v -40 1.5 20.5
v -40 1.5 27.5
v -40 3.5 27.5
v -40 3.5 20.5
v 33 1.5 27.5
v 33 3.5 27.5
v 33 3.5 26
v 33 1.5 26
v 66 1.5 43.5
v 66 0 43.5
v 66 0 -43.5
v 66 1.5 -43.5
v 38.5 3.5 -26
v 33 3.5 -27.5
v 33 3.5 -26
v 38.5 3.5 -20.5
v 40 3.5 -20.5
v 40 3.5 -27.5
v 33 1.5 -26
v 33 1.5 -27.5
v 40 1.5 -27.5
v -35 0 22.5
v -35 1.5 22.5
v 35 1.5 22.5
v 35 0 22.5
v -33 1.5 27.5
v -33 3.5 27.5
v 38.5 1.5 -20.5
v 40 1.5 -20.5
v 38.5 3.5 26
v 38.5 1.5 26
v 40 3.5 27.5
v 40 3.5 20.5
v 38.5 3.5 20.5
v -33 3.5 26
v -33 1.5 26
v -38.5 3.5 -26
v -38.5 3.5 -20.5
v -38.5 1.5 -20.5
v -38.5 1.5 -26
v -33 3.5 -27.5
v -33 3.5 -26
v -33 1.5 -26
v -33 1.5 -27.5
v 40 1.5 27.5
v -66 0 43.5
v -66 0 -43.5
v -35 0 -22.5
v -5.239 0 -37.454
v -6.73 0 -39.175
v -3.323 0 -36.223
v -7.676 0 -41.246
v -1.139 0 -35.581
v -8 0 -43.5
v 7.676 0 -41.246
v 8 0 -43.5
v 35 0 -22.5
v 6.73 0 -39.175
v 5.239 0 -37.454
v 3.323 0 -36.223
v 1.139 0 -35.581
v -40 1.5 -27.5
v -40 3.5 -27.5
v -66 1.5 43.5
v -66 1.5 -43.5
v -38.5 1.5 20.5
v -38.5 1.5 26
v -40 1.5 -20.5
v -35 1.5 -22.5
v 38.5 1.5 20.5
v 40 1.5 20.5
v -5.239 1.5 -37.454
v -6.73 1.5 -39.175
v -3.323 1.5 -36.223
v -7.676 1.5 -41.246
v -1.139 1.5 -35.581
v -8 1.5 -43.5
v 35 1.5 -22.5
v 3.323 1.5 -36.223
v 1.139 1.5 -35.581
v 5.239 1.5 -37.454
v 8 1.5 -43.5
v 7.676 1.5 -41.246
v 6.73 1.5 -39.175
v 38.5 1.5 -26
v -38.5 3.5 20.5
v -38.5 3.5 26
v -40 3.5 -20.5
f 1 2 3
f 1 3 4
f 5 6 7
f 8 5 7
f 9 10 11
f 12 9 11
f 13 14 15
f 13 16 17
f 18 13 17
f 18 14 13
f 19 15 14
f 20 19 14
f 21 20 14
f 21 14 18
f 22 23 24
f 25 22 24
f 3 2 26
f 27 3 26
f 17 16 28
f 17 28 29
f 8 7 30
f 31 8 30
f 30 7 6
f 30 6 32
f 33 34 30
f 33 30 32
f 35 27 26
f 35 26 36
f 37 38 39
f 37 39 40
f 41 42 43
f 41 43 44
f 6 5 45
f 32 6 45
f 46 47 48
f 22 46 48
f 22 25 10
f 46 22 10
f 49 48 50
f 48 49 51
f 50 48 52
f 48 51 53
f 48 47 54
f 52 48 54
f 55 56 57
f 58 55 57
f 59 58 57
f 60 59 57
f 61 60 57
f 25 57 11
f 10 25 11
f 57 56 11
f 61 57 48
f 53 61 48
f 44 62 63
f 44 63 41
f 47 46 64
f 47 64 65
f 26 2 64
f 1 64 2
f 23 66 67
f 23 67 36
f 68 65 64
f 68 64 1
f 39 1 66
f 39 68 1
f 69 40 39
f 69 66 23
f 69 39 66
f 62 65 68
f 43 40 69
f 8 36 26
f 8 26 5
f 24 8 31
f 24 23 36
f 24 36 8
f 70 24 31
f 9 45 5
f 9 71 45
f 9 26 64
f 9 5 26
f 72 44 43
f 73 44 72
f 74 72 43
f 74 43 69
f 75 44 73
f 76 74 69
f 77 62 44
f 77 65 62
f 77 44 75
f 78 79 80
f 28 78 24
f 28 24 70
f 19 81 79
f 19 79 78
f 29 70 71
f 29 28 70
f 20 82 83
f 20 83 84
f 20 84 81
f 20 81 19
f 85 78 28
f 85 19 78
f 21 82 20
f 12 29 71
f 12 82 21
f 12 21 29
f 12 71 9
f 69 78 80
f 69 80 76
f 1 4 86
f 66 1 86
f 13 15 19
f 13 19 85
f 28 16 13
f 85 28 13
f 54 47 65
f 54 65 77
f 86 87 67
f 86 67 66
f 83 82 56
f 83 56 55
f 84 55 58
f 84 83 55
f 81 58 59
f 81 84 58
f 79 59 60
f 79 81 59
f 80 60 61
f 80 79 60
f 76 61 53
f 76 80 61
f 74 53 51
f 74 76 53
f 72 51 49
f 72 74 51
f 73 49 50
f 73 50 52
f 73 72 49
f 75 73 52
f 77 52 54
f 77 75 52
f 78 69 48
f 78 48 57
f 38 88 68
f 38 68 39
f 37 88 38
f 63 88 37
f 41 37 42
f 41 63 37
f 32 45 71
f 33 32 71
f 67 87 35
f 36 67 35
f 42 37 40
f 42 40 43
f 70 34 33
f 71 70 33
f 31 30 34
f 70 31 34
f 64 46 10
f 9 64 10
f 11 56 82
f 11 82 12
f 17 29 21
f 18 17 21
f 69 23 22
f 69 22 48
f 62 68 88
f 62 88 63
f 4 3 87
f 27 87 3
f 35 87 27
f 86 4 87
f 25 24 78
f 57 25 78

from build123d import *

# Parameters (mm, degrees)
SKETCH1_W           = 132
SKETCH1_H           = 87
BOSS_EXTRUDE1_DEPTH = 1.5
SKETCH2_W           = 80
SKETCH2_H           = 55
BOSS_EXTRUDE2_DEPTH = 2
SKETCH3_W           = 77
SKETCH3_H           = 52
CUT_EXTRUDE1_DEPTH  = 2
CUT_EXTRUDE2_REACH  = 3.5
SKETCH4_W           = 70
SKETCH4_H           = 45
SKETCH5_W           = 1.5
SKETCH5_H           = 41
SKETCH5_W_2         = 66
SKETCH5_H_2         = 1.5
CUT_EXTRUDE3_DEPTH  = 2
CUT_EXTRUDE4_DEPTH  = 1.5


with BuildPart() as part:
    # Sketch1 → Boss-Extrude1 (new body)
    with BuildSketch(Plane(origin=(0, 0, 0), x_dir=(1, 0, 0), z_dir=(0, 1, 0))):
        Rectangle(SKETCH1_W, SKETCH1_H)
    extrude(amount=BOSS_EXTRUDE1_DEPTH)

    # Sketch2 → Boss-Extrude2 (add)
    with BuildSketch(Plane(origin=(0, 1.5, 0), x_dir=(1, 0, 0), z_dir=(0, 1, 0))):
        Rectangle(SKETCH2_W, SKETCH2_H)
    extrude(amount=BOSS_EXTRUDE2_DEPTH)

    # Sketch3 → Cut-Extrude1 (cut)
    with BuildSketch(Plane(origin=(0, 3.5, 0), x_dir=(1, 0, 0), z_dir=(0, 1, 0))):
        Rectangle(SKETCH3_W, SKETCH3_H)
    extrude(amount=-CUT_EXTRUDE1_DEPTH, mode=Mode.SUBTRACT)

    # Sketch4 → Cut-Extrude2 (cut, up to next)
    with BuildSketch(Plane(origin=(0, 1.5, 0), x_dir=(1, 0, 0), z_dir=(0, 1, 0)), mode=Mode.PRIVATE) as cut_extrude2_sk1:
        Rectangle(SKETCH4_W, SKETCH4_H)
    cut_extrude2_tool1 = extrude(cut_extrude2_sk1.sketch, amount=-CUT_EXTRUDE2_REACH, mode=Mode.PRIVATE) & part.part
    add(cut_extrude2_tool1.solids().sort_by_distance((0, 1.5, 0))[0], mode=Mode.SUBTRACT)

    # Sketch5 → Cut-Extrude3 (cut)
    with BuildSketch(Plane(origin=(0, 3.5, 0), x_dir=(1, 0, 0), z_dir=(0, 1, 0))):
        with Locations((-39.25, 0)):
            Rectangle(SKETCH5_W, SKETCH5_H)
        with Locations((39.25, 0)):
            Rectangle(SKETCH5_W, SKETCH5_H)
        with Locations((0, 26.75)):
            Rectangle(SKETCH5_W_2, SKETCH5_H_2)
        with Locations((0, -26.75)):
            Rectangle(SKETCH5_W_2, SKETCH5_H_2)
    extrude(amount=-CUT_EXTRUDE3_DEPTH, mode=Mode.SUBTRACT)

    # Sketch6 → Cut-Extrude4 (cut)
    with BuildSketch(Plane(origin=(0, 1.5, 0), x_dir=(1, 0, 0), z_dir=(0, 1, 0))):
        with BuildLine():
            Line((-8, 43.5), (8, 43.5))
            ThreePointArc((8, 43.5), (0, 35.5), (-8, 43.5))
        make_face()
    extrude(amount=-CUT_EXTRUDE4_DEPTH, mode=Mode.SUBTRACT)


solid = part.part
